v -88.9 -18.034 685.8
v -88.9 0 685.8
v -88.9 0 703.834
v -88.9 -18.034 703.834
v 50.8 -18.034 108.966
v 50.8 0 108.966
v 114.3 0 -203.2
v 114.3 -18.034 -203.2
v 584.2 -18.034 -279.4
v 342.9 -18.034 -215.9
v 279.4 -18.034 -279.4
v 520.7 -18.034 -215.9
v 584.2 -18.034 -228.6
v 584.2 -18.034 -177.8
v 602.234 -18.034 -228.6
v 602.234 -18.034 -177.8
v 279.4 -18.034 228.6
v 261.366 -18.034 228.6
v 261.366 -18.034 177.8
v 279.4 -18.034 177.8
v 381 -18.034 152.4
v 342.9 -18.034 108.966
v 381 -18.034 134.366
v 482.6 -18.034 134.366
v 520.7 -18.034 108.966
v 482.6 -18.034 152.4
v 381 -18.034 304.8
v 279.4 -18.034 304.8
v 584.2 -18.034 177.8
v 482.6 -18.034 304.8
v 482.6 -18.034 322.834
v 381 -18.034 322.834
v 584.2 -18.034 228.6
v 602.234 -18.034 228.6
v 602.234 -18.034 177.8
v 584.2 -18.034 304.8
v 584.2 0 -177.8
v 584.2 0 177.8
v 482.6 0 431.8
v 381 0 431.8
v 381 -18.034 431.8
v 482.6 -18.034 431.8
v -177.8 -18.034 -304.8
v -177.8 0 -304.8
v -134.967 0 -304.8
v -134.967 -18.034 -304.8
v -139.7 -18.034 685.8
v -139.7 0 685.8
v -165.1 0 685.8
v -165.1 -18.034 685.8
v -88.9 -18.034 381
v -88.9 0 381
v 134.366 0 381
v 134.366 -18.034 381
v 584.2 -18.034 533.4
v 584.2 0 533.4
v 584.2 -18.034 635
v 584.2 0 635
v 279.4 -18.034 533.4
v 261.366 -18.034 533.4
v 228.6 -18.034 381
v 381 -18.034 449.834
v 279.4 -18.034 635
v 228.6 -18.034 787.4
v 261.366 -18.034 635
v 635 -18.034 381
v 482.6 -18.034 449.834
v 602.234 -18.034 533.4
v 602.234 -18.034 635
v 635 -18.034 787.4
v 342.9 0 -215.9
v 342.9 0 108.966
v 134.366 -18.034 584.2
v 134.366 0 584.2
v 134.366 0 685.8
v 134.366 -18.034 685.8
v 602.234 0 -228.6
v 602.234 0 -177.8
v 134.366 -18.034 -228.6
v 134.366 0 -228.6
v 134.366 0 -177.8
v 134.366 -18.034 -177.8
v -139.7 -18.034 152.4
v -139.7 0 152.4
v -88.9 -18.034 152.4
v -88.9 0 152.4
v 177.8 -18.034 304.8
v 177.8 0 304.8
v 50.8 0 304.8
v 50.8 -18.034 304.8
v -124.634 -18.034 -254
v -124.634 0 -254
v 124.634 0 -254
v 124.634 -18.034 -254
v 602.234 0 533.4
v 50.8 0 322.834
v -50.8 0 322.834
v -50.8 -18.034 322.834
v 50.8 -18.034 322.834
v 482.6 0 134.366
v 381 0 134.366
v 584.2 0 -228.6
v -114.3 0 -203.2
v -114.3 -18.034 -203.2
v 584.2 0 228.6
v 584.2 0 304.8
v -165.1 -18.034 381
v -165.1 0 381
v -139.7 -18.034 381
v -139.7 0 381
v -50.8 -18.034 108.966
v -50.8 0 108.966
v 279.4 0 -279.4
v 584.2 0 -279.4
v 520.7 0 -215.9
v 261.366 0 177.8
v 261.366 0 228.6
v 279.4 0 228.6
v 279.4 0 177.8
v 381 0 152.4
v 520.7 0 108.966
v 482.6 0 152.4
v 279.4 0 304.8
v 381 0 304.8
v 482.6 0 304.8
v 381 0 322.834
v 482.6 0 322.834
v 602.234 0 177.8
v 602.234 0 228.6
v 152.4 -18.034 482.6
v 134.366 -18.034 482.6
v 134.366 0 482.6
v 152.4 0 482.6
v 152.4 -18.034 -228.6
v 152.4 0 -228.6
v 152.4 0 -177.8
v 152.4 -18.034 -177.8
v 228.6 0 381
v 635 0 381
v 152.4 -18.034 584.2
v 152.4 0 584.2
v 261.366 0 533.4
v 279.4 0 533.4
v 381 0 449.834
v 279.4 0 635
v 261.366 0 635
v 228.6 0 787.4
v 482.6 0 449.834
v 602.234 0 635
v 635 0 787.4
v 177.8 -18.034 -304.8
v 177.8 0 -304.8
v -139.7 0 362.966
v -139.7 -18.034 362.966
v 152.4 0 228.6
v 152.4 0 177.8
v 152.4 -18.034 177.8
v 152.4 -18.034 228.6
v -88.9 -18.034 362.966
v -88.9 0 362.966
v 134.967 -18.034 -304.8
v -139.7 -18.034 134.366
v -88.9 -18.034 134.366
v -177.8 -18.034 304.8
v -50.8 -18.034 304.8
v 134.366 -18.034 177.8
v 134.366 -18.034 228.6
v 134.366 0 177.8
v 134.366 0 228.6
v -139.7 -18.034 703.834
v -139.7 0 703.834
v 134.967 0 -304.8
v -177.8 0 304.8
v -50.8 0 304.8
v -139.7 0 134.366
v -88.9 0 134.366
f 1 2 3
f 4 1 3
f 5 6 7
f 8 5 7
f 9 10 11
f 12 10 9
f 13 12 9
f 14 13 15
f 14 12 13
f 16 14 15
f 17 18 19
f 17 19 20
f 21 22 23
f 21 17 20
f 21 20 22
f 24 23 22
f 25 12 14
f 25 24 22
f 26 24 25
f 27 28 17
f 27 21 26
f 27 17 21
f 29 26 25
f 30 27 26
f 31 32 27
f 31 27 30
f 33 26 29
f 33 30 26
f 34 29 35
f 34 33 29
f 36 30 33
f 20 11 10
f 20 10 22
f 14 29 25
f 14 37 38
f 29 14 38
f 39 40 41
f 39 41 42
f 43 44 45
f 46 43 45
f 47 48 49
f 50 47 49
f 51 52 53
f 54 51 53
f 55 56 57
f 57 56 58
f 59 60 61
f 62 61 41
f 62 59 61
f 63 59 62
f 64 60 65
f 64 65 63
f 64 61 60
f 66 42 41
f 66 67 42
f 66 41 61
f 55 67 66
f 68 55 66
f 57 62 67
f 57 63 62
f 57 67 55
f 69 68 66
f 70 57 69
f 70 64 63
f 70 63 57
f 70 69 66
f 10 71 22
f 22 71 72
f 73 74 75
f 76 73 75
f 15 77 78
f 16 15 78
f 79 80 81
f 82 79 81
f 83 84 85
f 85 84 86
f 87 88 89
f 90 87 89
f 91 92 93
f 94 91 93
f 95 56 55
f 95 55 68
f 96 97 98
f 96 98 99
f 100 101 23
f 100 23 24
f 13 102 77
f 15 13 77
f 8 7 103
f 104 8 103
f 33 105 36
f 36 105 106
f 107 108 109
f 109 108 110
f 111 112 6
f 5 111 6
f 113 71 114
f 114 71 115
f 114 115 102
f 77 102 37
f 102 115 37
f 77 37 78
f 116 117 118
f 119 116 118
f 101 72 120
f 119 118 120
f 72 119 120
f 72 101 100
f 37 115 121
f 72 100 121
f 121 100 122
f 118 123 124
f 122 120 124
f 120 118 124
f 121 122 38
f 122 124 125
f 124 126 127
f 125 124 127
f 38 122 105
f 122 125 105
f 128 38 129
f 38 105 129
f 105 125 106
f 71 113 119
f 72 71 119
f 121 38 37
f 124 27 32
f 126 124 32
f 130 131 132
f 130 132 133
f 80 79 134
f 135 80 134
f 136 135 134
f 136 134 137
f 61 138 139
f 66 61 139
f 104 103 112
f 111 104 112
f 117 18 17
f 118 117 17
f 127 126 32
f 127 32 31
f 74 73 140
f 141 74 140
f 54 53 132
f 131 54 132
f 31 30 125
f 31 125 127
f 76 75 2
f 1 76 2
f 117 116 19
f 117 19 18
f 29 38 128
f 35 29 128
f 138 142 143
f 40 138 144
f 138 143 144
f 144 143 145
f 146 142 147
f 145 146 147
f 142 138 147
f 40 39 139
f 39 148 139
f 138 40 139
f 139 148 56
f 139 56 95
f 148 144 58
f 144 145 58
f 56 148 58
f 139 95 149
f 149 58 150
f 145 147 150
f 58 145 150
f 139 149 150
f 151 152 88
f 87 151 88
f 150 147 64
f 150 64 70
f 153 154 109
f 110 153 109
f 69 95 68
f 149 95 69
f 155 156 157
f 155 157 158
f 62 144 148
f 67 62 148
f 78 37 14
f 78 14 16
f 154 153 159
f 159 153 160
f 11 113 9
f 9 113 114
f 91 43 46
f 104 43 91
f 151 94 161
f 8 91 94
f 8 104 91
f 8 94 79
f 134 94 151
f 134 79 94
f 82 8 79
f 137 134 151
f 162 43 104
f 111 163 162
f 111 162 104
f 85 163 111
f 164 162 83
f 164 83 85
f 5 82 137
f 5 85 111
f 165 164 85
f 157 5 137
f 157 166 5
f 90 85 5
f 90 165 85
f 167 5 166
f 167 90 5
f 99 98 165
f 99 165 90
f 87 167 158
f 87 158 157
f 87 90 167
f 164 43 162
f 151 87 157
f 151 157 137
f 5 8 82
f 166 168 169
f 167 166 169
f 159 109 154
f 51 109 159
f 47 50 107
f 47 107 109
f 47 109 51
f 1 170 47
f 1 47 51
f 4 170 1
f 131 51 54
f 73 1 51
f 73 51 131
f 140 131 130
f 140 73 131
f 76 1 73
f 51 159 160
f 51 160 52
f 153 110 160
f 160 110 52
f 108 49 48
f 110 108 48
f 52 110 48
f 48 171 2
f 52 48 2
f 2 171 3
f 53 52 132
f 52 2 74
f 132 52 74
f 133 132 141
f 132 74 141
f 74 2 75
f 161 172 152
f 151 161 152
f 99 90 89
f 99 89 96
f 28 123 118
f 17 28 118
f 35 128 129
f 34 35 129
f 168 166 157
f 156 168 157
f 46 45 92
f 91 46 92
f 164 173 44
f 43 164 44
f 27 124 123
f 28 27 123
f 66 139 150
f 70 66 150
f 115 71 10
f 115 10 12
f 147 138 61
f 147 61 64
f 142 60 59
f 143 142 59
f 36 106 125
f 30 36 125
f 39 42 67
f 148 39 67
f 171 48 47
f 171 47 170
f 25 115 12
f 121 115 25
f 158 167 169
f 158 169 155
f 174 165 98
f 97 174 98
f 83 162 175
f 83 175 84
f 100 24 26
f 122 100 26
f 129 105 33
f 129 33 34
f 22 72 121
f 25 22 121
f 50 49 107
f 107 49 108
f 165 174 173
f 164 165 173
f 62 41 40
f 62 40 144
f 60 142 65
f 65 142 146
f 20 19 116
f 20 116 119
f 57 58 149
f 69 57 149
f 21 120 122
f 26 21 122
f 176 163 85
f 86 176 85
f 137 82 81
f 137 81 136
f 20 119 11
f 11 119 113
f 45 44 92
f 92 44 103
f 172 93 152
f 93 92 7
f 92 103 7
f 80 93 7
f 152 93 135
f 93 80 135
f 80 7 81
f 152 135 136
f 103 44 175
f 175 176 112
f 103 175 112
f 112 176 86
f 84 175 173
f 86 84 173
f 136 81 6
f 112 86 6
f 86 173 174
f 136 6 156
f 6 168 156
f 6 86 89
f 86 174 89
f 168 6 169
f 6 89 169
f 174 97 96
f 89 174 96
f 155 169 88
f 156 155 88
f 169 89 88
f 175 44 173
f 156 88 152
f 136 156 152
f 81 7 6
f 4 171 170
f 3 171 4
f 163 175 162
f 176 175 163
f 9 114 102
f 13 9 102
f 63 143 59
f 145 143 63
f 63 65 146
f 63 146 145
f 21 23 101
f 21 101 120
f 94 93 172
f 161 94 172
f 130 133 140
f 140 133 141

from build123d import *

# Parameters (mm, degrees)
F0_W     = 50.8
F0_H     = 18.034
F0_W_2   = 18.034
F0_H_2   = 101.6
F0_W_3   = 406.4
F0_H_3   = 406.4
F0_W_4   = 101.6
F0_W_5   = 177.8
F0_H_4   = 324.866
F0_H_5   = 50.8
F1_DEPTH = 18.034


with BuildPart() as f1:
    # F0 (on Front) → F1 (new body)
    with BuildSketch(Plane.XZ):
        Polygon((-88.9, 381), (134.366, 381), (134.366, 482.6), (134.366, 584.2), (134.366, 685.8), (-88.9, 685.8), (-139.7, 685.8), (-165.1, 685.8), (-165.1, 381), (-139.7, 381), align=None)
        with Locations((-114.3, 694.817)):
            Rectangle(F0_W, F0_H)
        with Locations((-114.3, 371.983)):
            Rectangle(F0_W, F0_H)
        with Locations((143.383, 533.4)):
            Rectangle(F0_W_2, F0_H_2)
        with Locations((431.8, 584.2)):
            Rectangle(F0_W_3, F0_H_3)
        with Locations((431.8, 440.817)):
            Rectangle(F0_W_4, F0_H, mode=Mode.SUBTRACT)
        with Locations((270.383, 584.2)):
            Rectangle(F0_W_2, F0_H_2, mode=Mode.SUBTRACT)
        with Locations((593.217, 584.2)):
            Rectangle(F0_W_2, F0_H_2, mode=Mode.SUBTRACT)
        Polygon((381, 304.8), (279.4, 304.8), (279.4, 228.6), (279.4, 177.8), (279.4, -177.8), (279.4, -228.6), (279.4, -279.4), (584.2, -279.4), (584.2, -228.6), (584.2, -177.8), (584.2, 177.8), (584.2, 228.6), (584.2, 304.8), (482.6, 304.8), align=None)
        with Locations((431.8, -53.467)):
            Rectangle(F0_W_5, F0_H_4, mode=Mode.SUBTRACT)
        with Locations((431.8, 143.383)):
            Rectangle(F0_W_4, F0_H, mode=Mode.SUBTRACT)
        with Locations((270.383, 203.2)):
            Rectangle(F0_W_2, F0_H_5)
        with Locations((431.8, 313.817)):
            Rectangle(F0_W_4, F0_H)
        with Locations((593.217, 203.2)):
            Rectangle(F0_W_2, F0_H_5)
        with Locations((593.217, -203.2)):
            Rectangle(F0_W_2, F0_H_5)
        Polygon((-50.8, 304.8), (-177.8, 304.8), (-177.8, -304.8), (-134.967209, -304.8), (-124.633605, -254), (-114.3, -254), (114.3, -254), (124.633605, -254), (134.967209, -304.8), (177.8, -304.8), (177.8, 304.8), (50.8, 304.8), align=None)
        Polygon((-114.3, -203.2), (-50.8, 108.966), (50.8, 108.966), (114.3, -203.2), align=None, mode=Mode.SUBTRACT)
        with Locations((143.383, -203.2)):
            Rectangle(F0_W_2, F0_H_5, mode=Mode.SUBTRACT)
        with Locations((-114.3, 143.383)):
            Rectangle(F0_W, F0_H, mode=Mode.SUBTRACT)
        with Locations((143.383, 203.2)):
            Rectangle(F0_W_2, F0_H_5, mode=Mode.SUBTRACT)
        with Locations((0, 313.817)):
            Rectangle(F0_W_4, F0_H)
    extrude(amount=F1_DEPTH)


solid = f1.part
